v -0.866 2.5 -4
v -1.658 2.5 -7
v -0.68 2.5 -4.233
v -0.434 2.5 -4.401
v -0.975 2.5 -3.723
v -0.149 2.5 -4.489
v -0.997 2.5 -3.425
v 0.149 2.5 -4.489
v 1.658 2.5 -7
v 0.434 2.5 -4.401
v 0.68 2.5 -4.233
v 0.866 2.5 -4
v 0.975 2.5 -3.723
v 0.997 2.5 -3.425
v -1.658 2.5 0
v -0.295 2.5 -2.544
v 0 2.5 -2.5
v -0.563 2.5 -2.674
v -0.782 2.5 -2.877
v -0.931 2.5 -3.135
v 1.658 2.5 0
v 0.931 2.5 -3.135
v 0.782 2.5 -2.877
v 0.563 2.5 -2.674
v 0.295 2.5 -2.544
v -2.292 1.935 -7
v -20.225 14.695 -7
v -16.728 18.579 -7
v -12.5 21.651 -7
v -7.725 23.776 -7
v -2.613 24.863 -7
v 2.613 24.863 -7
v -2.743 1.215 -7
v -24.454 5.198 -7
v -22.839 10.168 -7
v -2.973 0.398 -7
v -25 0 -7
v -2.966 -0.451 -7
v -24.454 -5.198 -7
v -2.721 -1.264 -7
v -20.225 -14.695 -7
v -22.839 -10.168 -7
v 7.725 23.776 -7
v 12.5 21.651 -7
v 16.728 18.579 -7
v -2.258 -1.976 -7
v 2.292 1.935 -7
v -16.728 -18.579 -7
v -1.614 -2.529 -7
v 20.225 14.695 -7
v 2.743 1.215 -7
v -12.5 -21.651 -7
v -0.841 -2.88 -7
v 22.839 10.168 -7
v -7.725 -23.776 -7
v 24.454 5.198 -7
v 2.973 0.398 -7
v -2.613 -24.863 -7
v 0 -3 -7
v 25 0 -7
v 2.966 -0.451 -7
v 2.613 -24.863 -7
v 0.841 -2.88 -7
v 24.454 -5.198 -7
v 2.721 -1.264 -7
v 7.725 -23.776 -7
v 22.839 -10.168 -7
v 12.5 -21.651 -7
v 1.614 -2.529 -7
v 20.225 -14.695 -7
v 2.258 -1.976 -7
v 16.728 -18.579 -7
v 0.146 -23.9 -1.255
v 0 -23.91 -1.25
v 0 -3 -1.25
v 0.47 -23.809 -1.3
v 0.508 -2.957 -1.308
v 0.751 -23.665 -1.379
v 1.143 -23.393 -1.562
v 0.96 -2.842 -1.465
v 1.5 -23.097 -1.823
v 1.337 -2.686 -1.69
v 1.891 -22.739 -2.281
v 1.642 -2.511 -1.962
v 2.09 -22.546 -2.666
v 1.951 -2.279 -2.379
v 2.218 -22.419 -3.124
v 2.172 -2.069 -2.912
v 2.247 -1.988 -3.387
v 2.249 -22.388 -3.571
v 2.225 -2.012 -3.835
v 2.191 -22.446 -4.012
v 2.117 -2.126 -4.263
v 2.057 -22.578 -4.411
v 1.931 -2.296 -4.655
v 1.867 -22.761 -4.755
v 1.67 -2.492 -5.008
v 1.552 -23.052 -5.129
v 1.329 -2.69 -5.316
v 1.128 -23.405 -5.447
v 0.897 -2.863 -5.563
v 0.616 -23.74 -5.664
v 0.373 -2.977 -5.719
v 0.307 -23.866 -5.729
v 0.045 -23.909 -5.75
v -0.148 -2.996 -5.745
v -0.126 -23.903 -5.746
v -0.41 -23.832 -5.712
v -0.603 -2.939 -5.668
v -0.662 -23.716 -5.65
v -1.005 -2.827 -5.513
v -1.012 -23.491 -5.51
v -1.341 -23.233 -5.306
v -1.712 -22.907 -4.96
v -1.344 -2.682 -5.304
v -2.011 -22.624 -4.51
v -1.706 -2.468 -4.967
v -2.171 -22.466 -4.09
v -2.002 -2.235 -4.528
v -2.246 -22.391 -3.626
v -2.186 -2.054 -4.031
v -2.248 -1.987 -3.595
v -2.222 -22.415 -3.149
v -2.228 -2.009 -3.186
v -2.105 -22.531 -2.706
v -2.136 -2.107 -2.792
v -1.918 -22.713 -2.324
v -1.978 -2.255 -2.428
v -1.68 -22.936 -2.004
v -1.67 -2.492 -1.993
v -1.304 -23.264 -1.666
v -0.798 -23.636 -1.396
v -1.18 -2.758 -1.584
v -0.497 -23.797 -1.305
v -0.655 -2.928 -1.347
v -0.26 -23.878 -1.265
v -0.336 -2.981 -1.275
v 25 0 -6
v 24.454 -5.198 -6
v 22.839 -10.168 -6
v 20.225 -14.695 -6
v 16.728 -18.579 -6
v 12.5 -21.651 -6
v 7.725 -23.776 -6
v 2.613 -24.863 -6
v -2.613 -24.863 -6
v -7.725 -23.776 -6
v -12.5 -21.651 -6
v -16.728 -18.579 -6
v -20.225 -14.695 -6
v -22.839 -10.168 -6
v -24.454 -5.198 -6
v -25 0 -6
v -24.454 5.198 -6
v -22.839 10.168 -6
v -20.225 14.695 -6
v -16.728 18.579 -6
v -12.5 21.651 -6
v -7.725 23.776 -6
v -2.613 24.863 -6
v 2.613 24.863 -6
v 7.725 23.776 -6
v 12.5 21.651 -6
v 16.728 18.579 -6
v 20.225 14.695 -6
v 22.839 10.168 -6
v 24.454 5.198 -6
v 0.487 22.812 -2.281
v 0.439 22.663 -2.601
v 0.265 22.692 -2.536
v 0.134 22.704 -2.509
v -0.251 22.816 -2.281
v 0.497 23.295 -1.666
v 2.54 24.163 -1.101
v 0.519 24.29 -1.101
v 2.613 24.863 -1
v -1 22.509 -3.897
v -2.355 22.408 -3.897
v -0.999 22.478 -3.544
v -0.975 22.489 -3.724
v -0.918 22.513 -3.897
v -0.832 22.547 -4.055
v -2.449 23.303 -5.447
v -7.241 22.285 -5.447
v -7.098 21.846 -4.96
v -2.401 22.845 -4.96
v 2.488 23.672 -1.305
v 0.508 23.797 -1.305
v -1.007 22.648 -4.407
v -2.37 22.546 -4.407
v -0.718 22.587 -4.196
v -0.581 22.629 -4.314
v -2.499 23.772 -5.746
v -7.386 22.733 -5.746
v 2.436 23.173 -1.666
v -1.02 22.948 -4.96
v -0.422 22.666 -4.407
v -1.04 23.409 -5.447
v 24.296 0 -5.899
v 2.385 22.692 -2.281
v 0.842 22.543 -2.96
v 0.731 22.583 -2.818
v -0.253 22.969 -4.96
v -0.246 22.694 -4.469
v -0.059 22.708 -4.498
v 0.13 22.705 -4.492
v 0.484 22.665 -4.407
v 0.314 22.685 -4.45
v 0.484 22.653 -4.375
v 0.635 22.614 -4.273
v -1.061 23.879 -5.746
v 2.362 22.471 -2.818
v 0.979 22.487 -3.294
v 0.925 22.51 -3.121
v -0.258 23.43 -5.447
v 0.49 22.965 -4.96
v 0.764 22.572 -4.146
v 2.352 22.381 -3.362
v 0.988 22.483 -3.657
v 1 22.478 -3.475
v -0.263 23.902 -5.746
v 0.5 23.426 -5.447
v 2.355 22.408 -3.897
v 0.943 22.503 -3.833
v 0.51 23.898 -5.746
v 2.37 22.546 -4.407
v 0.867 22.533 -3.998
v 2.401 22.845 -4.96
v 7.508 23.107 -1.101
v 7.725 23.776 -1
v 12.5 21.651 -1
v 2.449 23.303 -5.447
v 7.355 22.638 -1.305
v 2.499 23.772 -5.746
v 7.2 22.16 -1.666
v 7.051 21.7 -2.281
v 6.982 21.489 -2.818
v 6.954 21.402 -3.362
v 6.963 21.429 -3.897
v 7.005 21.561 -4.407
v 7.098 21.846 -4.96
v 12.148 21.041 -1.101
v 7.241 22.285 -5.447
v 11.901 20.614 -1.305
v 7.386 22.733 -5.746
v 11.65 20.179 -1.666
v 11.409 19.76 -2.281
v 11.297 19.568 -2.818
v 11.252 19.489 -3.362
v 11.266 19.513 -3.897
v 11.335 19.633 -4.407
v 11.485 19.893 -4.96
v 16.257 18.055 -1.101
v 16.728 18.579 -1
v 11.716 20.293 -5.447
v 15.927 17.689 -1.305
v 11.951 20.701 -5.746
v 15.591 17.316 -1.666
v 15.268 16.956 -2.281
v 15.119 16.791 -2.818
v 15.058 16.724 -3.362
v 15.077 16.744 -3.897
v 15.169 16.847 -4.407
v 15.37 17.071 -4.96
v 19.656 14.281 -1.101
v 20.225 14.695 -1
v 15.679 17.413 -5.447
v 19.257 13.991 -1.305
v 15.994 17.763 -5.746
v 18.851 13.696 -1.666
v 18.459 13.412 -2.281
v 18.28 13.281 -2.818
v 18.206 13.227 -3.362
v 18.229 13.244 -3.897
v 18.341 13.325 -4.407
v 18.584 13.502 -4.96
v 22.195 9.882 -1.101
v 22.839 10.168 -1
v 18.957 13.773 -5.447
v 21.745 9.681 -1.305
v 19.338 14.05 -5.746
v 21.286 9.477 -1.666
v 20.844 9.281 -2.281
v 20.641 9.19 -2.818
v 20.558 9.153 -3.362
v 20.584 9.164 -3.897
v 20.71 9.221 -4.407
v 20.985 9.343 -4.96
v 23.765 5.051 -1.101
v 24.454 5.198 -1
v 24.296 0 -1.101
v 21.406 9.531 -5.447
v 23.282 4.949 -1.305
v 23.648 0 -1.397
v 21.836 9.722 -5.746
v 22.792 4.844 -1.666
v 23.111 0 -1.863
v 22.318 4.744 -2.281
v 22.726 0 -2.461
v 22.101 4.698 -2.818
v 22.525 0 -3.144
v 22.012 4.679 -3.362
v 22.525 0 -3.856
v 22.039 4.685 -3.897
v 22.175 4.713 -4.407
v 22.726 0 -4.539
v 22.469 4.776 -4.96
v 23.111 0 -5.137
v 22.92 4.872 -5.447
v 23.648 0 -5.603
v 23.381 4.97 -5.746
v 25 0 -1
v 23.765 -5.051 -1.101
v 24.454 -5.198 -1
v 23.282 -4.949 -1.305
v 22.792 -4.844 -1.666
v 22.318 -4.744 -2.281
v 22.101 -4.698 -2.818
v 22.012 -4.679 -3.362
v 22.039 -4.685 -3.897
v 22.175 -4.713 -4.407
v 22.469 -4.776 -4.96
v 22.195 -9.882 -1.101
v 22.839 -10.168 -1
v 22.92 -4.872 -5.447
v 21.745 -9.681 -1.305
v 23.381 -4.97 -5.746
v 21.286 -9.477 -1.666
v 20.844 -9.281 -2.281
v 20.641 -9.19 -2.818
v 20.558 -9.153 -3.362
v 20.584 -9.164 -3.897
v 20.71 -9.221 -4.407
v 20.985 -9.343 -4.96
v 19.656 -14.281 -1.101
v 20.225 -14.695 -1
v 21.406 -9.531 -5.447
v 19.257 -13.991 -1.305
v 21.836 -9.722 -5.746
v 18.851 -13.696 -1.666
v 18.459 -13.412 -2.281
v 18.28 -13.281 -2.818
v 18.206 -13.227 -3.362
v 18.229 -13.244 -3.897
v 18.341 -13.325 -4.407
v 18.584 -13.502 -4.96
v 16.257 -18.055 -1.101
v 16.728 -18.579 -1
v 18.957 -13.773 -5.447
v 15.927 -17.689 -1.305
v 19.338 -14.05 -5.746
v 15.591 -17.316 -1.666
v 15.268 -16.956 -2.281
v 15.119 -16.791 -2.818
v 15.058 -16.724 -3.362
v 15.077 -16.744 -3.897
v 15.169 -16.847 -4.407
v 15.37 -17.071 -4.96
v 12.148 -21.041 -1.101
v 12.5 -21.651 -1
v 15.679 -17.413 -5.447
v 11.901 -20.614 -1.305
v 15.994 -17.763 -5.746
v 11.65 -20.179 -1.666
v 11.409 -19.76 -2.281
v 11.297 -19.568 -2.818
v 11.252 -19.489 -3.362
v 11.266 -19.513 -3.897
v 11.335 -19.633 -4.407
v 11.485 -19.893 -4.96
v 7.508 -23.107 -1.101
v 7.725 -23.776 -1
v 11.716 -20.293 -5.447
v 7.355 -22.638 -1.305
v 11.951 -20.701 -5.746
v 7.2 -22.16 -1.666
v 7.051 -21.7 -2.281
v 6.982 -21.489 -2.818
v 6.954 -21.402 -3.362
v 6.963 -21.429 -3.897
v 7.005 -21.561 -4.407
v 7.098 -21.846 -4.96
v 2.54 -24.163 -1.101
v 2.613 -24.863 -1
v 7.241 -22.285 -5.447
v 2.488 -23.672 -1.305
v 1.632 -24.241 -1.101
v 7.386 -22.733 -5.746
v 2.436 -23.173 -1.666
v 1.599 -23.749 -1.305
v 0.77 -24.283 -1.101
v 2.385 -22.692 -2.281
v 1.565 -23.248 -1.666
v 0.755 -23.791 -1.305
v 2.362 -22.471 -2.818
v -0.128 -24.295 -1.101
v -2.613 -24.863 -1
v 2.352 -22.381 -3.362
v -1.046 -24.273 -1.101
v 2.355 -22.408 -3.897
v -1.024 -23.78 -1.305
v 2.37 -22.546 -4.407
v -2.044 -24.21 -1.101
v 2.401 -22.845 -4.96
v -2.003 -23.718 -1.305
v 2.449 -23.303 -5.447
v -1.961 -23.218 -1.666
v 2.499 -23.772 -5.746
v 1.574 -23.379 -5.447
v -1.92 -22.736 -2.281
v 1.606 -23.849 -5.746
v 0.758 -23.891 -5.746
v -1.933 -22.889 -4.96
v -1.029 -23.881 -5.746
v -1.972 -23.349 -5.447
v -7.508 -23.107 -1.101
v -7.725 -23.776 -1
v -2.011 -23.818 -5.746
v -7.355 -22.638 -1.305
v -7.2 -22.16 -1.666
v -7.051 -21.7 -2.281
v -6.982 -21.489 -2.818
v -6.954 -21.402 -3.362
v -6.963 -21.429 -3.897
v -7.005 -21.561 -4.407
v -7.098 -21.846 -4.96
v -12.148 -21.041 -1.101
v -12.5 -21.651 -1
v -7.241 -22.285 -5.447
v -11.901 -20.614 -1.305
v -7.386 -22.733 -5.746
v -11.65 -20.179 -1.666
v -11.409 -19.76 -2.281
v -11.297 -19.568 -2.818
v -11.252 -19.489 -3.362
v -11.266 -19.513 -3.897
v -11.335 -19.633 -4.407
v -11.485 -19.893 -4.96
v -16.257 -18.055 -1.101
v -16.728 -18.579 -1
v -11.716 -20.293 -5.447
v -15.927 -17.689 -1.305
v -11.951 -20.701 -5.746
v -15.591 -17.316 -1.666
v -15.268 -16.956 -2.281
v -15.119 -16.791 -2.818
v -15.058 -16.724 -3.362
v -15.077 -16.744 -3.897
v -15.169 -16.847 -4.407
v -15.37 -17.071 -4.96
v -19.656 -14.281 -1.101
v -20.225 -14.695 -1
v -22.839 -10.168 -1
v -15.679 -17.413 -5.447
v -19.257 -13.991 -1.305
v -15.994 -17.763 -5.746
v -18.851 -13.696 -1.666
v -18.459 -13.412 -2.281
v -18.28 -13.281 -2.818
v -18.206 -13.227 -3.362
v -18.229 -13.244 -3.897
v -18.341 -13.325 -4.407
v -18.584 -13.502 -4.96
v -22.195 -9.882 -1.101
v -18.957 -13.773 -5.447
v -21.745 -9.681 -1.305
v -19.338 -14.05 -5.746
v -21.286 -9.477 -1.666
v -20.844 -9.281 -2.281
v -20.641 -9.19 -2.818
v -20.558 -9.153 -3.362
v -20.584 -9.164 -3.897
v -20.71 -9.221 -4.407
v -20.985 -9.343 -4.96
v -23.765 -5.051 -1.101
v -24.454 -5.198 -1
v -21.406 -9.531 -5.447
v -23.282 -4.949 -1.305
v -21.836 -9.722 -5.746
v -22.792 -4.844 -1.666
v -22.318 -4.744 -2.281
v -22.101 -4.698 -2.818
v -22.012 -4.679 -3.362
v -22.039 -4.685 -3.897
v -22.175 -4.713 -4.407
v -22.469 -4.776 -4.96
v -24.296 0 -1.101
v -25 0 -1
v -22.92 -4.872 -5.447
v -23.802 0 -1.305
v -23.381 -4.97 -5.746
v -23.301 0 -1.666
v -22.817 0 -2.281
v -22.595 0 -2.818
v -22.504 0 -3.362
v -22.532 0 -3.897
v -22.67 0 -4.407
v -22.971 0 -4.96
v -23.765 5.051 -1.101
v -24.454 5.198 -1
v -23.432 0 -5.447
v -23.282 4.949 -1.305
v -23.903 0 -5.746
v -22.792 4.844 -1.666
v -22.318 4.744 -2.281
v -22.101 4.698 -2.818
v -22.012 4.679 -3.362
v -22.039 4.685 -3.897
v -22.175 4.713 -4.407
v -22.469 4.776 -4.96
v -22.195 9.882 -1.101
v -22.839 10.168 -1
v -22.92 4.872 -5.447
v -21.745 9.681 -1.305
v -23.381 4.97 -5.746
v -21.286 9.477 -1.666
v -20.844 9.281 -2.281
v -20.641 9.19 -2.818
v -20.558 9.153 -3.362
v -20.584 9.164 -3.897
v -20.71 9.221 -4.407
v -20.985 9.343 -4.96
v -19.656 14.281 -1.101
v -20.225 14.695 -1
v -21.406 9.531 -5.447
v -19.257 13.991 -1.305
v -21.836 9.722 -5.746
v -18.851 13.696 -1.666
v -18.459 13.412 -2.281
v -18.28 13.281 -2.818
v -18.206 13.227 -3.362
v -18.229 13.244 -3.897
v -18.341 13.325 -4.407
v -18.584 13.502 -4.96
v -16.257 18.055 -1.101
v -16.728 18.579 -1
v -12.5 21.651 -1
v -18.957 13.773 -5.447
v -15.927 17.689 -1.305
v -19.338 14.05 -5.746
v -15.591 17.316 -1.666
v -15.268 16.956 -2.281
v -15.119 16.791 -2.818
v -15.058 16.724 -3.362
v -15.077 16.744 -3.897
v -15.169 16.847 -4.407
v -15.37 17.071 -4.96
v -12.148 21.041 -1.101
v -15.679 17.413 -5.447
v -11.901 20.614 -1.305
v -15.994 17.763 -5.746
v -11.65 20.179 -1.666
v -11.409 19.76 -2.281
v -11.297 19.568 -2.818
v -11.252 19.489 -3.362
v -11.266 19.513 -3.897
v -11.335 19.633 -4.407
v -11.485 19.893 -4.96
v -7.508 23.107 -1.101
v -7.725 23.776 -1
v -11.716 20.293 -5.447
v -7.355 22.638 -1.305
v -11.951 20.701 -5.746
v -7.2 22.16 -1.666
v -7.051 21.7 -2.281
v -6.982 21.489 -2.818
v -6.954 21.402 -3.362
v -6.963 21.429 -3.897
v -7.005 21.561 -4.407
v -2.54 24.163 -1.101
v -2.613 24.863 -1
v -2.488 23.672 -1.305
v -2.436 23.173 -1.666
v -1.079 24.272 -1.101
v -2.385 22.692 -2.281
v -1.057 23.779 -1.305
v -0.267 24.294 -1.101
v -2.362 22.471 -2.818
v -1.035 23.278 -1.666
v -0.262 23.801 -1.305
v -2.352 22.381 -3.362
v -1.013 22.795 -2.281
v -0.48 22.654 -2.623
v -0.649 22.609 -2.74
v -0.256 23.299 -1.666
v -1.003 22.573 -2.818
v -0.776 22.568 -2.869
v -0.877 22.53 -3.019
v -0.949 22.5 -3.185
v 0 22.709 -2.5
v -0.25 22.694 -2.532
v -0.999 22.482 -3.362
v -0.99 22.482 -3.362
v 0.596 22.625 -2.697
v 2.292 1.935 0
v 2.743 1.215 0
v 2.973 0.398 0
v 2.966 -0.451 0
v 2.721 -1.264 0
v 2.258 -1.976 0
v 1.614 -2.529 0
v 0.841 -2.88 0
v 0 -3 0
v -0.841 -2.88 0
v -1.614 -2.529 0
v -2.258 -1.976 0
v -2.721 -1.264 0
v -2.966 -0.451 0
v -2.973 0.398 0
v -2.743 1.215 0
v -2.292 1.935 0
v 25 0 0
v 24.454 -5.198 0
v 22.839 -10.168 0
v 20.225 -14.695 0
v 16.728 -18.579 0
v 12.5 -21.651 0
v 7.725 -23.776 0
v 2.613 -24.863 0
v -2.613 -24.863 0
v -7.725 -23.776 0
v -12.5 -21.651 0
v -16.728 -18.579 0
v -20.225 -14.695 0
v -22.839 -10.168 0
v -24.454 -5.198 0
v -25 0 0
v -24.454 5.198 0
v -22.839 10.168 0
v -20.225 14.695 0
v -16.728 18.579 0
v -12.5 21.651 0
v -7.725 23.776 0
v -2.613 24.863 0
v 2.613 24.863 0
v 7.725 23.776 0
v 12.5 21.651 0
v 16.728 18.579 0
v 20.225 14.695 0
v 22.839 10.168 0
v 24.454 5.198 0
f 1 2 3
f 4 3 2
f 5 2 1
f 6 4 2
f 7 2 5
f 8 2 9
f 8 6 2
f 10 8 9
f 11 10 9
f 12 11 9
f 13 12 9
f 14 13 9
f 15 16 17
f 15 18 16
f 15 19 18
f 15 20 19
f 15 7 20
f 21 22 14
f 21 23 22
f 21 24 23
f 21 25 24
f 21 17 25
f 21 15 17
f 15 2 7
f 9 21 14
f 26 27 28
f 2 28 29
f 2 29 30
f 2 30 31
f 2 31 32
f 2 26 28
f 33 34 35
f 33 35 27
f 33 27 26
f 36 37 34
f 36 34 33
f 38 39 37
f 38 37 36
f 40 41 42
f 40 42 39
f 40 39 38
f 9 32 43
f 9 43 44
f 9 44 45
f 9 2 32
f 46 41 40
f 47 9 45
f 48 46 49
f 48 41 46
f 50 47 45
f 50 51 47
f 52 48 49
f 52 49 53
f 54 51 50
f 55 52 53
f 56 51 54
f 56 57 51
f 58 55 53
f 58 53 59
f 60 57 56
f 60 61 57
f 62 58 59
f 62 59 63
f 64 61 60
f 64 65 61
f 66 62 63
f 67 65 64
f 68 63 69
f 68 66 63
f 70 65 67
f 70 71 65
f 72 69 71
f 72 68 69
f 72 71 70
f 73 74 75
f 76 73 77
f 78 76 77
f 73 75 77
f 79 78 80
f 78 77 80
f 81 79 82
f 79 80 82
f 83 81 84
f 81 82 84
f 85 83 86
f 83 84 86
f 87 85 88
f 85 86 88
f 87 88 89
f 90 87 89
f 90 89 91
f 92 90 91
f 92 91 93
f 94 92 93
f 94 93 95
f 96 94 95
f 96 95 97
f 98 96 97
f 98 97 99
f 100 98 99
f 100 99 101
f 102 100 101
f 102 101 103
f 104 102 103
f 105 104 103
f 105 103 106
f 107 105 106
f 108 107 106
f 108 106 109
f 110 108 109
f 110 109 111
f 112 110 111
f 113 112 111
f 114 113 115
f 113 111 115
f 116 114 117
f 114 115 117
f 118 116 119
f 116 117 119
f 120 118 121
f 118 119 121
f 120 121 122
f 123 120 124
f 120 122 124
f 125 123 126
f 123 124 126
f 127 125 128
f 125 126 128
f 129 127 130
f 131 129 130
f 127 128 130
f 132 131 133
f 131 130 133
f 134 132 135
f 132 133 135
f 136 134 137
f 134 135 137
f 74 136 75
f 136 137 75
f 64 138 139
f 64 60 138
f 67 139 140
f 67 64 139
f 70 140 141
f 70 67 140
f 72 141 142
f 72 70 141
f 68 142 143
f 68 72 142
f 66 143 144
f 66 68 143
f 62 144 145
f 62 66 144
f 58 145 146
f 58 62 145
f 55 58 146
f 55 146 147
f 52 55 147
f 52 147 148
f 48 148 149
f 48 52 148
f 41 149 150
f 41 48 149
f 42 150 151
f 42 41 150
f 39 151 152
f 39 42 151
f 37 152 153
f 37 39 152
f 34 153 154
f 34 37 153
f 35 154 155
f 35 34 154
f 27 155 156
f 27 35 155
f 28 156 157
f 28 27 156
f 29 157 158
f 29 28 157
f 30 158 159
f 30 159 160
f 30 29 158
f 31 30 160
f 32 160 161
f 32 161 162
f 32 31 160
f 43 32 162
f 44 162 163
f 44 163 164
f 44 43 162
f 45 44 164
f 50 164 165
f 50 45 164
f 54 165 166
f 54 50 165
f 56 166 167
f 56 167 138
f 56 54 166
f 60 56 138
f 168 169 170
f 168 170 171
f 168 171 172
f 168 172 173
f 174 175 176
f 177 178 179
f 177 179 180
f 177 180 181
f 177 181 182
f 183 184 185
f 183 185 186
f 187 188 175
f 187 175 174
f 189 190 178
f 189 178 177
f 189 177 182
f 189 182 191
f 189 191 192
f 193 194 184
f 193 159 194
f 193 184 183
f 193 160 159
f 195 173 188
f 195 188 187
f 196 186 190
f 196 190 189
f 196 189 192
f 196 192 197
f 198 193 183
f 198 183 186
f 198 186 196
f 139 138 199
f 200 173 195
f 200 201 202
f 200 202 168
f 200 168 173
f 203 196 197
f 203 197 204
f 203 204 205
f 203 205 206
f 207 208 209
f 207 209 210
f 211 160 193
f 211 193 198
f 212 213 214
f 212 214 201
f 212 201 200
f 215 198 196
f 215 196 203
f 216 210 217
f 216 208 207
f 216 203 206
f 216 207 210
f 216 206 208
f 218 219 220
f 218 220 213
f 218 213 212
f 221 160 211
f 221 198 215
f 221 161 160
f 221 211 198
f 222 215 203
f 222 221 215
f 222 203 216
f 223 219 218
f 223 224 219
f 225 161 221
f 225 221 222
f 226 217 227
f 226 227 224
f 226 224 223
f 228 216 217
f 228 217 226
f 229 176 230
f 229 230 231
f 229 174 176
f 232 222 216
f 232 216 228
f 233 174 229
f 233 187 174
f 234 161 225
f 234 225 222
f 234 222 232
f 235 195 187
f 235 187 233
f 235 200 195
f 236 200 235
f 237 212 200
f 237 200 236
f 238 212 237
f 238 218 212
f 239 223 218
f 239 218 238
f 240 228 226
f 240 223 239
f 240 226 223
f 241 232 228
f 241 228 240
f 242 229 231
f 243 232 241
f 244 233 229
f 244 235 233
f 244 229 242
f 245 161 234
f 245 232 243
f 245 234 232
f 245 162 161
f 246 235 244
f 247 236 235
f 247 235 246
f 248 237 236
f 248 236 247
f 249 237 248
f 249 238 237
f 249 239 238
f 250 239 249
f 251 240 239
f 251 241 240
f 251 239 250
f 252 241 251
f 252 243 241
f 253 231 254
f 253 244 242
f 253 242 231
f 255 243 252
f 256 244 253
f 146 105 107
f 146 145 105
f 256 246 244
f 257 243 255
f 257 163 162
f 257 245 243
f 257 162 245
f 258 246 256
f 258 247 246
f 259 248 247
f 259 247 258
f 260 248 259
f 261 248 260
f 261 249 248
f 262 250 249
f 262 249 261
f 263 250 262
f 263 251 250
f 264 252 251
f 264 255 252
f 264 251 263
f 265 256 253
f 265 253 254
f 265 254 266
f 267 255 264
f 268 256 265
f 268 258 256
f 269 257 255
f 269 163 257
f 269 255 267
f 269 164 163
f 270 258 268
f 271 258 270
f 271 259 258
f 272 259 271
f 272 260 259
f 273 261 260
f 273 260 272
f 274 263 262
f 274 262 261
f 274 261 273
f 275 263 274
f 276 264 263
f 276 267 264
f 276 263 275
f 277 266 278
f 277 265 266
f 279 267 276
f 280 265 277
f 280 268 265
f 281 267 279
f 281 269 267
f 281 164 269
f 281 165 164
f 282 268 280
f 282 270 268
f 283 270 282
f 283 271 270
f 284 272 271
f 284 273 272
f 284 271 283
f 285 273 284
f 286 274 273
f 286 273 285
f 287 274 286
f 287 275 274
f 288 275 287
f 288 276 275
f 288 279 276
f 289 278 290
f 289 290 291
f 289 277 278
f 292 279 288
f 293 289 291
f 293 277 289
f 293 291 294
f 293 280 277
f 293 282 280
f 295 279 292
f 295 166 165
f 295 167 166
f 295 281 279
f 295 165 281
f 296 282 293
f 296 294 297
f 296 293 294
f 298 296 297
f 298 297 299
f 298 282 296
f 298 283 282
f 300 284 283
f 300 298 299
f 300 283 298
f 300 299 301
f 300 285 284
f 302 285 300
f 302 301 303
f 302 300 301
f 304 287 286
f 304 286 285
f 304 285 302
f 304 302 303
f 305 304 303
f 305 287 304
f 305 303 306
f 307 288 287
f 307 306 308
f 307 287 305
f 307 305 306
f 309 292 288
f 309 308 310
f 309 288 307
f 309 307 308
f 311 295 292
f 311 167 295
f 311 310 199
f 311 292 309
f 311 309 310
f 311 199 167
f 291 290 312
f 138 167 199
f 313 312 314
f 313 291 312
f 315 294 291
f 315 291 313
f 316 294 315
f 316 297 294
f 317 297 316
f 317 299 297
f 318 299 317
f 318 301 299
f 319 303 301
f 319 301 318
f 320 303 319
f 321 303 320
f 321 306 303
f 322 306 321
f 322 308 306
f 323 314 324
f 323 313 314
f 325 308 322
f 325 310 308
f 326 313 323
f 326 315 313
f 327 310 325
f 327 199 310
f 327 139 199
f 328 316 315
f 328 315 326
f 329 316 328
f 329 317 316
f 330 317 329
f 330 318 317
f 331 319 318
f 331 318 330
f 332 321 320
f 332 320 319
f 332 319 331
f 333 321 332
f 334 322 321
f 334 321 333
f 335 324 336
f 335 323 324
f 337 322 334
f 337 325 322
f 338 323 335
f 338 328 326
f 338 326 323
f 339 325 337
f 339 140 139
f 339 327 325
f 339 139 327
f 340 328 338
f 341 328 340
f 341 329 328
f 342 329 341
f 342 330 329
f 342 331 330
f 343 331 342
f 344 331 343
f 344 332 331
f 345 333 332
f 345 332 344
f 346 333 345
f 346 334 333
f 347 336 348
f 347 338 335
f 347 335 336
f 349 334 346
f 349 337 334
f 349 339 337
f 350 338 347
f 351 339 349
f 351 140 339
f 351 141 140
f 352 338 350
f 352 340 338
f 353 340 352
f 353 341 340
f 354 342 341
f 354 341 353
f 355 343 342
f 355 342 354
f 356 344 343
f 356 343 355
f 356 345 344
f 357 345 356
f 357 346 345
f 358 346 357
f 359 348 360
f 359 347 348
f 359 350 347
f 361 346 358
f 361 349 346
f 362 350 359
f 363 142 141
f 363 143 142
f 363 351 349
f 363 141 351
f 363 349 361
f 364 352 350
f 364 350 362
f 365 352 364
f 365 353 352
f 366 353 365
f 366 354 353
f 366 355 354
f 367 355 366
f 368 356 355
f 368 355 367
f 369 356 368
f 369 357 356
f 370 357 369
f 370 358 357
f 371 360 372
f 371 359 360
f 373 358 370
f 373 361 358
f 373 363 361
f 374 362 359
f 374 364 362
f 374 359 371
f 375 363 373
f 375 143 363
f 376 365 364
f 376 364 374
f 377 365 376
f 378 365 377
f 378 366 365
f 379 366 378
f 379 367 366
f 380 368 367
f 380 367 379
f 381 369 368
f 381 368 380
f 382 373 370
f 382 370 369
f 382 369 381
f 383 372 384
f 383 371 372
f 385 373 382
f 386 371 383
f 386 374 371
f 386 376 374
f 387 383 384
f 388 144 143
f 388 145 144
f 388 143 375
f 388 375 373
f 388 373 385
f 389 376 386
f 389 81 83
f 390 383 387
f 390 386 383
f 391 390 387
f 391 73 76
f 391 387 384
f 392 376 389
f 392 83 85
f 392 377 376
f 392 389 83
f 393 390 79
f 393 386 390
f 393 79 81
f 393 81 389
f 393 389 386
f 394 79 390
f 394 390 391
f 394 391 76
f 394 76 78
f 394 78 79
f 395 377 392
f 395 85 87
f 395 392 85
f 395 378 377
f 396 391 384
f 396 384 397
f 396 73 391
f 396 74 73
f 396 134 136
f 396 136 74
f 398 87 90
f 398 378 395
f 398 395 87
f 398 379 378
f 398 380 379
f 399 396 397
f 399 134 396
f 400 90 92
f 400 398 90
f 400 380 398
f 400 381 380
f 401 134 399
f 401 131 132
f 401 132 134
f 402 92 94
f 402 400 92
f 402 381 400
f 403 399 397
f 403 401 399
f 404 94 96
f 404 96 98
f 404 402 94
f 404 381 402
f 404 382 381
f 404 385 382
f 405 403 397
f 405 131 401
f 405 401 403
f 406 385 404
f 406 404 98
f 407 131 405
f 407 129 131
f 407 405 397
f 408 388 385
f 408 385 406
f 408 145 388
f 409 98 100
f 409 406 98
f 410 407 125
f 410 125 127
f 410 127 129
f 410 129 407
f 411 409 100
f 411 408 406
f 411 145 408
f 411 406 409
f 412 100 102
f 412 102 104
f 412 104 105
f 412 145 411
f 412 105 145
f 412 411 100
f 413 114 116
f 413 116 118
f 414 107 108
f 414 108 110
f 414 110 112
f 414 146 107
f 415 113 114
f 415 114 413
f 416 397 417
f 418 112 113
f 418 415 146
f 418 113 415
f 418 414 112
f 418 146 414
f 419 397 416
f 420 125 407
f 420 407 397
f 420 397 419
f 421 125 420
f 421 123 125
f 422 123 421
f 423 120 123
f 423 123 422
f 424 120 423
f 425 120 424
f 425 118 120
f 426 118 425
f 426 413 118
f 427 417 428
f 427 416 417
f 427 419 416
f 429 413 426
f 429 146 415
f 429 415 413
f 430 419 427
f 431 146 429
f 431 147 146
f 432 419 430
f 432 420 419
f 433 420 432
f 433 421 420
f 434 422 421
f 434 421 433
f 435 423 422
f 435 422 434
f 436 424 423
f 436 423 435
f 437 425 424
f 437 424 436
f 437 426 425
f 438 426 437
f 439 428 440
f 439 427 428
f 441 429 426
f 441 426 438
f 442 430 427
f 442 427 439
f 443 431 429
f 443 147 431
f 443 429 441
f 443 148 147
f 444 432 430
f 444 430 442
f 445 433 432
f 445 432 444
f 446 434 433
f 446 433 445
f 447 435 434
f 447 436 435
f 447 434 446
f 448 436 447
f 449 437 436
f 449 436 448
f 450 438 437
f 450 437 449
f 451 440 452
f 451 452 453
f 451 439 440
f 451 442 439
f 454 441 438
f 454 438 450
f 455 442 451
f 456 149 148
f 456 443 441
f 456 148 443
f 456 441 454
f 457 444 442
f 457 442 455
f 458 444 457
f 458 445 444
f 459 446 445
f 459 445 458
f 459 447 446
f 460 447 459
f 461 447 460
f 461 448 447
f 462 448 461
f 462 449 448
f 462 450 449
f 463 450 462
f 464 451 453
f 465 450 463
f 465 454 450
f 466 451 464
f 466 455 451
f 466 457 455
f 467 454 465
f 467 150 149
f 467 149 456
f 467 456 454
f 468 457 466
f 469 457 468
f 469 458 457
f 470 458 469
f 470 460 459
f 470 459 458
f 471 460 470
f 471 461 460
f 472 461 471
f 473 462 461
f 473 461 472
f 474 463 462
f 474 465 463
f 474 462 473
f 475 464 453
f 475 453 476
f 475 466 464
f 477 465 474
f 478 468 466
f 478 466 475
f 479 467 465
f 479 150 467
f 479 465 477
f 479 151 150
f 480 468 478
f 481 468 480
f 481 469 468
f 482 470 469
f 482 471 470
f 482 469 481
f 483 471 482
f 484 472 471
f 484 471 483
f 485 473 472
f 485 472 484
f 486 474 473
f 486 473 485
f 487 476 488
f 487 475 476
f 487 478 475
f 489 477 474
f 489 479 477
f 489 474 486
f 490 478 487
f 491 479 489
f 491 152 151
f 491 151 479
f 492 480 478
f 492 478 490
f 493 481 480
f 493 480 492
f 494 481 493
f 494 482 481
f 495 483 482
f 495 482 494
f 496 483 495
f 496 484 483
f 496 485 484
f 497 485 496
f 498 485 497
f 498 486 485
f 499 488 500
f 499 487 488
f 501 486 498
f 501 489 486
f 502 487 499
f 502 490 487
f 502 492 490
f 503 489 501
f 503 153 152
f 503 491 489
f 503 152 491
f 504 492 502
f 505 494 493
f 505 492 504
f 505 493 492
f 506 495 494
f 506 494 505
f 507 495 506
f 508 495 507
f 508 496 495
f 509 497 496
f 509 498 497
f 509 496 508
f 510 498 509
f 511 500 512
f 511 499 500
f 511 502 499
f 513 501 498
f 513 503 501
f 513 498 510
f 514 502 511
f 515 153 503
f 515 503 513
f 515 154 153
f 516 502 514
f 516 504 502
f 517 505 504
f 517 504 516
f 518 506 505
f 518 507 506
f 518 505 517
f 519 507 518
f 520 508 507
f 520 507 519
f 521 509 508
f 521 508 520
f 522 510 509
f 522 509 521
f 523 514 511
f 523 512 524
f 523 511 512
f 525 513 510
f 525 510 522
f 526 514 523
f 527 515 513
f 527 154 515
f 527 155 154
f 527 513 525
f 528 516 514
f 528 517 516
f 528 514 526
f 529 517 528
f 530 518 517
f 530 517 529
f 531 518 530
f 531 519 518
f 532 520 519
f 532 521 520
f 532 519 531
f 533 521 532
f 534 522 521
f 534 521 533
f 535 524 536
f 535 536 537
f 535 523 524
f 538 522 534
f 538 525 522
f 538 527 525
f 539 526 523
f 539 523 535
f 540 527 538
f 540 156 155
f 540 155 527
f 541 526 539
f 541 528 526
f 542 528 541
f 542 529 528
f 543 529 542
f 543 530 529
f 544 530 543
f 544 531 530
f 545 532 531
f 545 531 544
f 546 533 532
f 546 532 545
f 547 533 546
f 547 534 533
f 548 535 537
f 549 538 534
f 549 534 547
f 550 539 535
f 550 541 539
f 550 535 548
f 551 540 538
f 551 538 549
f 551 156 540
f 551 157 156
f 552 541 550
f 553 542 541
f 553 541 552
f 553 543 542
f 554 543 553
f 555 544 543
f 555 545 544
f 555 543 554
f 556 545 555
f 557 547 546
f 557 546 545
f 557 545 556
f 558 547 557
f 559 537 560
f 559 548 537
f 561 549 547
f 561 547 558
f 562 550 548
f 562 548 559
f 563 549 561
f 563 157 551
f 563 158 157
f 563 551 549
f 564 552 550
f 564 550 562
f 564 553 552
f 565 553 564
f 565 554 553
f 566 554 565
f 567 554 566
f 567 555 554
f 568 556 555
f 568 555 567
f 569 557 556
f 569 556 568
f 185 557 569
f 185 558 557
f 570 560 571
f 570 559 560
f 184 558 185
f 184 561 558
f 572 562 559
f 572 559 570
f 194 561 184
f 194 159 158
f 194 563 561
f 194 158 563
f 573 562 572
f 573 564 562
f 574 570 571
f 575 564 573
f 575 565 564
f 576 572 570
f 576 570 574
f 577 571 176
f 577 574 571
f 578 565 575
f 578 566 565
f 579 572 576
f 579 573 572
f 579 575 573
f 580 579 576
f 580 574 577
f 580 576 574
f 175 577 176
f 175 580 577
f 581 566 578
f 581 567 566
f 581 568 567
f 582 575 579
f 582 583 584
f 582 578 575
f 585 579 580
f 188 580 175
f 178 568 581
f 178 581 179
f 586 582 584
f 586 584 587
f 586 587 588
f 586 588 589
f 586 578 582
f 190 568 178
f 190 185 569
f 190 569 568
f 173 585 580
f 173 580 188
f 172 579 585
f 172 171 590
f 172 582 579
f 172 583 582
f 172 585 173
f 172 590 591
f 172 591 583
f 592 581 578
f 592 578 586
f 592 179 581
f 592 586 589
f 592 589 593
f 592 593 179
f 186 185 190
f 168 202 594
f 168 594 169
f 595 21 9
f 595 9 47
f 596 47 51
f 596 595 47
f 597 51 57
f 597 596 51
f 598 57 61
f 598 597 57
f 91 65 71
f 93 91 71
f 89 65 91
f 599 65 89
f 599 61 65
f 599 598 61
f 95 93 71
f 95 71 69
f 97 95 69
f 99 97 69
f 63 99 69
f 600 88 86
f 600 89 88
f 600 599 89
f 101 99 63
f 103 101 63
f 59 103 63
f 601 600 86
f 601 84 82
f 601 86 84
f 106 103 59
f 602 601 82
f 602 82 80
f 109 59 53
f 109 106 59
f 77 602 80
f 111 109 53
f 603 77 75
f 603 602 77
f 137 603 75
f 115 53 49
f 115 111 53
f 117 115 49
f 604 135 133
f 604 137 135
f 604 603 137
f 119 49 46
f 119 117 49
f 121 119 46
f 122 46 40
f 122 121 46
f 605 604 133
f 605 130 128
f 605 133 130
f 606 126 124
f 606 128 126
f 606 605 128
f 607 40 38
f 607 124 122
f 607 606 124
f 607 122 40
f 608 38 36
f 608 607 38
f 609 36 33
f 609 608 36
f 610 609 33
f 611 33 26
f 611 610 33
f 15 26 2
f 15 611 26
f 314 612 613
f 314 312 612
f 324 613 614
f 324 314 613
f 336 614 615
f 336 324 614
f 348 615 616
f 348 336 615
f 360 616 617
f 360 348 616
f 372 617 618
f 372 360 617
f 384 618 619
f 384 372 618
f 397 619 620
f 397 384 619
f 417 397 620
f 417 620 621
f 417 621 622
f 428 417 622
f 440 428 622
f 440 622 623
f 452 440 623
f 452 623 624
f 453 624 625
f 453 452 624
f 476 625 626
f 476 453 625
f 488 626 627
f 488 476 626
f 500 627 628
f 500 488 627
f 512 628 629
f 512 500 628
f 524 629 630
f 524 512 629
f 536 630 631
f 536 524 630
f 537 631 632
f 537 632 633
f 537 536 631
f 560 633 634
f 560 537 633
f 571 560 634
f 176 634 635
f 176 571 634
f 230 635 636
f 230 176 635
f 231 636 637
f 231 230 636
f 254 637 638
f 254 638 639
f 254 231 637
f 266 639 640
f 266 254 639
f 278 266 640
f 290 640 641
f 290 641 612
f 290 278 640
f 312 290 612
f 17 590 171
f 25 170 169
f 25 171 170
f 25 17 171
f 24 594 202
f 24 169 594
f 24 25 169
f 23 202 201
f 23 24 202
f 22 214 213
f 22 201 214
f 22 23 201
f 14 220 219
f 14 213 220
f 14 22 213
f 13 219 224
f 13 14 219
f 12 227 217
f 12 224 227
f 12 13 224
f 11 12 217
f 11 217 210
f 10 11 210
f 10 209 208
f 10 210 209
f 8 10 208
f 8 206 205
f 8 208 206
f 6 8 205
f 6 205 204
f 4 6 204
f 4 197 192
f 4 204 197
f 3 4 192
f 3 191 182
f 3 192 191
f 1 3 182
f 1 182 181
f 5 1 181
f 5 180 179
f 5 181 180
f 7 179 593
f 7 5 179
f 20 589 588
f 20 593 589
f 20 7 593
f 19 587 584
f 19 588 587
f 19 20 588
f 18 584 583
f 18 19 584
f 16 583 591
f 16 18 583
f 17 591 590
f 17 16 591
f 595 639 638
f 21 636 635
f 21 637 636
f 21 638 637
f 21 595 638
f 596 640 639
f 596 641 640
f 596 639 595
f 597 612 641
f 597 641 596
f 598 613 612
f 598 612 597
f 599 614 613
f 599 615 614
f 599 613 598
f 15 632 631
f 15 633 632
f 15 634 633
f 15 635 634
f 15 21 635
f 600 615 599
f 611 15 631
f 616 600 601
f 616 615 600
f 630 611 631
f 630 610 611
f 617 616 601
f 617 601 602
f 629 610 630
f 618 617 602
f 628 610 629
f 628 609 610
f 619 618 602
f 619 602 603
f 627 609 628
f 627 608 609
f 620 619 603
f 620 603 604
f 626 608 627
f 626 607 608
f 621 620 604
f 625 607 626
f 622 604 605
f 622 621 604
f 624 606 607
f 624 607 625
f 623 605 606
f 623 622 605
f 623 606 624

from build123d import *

# Parameters (mm, degrees)
CUT_EXTRUDE1_DEPTH      = 37.041642582
CUT_EXTRUDE2_DEPTH      = 37.041642582
CUT_EXTRUDE2_DEPTH_BACK = 37.041642582
SKETCH4_R               = 1
SKETCH6_R               = 2.25
CUT_EXTRUDE3_DEPTH      = 37.04164274


with BuildPart() as part:
    # Sketch2 → Revolve1 (revolve)
    with BuildSketch(Plane(origin=(0, 0, 0), x_dir=(1, 0, 0), z_dir=(0, 1, 0))):
        with BuildLine():
            Line((25, 6), (25, 7))
            Line((25, 7), (0, 7))
            Line((0, 7), (0, 0))
            Line((0, 0), (25, 0))
            Line((25, 0), (25, 1))
            ThreePointArc((25, 1), (22.5, 3.5), (25, 6))
        make_face()
    revolve(axis=Axis((0, 0, 0), (0, 0, -1)))

    # Sketch3 → Cut-Extrude1 (cut, through all)
    with BuildSketch(Plane.XY):
        with BuildLine():
            Line((-1.658312395, 2.5), (1.658312395, 2.5))
            ThreePointArc((1.658312395, 2.5), (0, -3), (-1.658312395, 2.5))
        make_face()
    extrude(amount=-CUT_EXTRUDE1_DEPTH, mode=Mode.SUBTRACT)

    # Sketch4 → Cut-Extrude2 (cut, two sides: drawn at the far end of the back side and taken through both)
    with BuildSketch(Plane(origin=(0, 0, 0), x_dir=(1, 0, 0), z_dir=(0, 1, 0)).offset(-CUT_EXTRUDE2_DEPTH_BACK)):
        with Locations(Location((0, 3.5, 0), (0, 0, 270))):
            Circle(SKETCH4_R)
    extrude(amount=CUT_EXTRUDE2_DEPTH + CUT_EXTRUDE2_DEPTH_BACK, mode=Mode.SUBTRACT)

    # Sketch6 → Cut-Extrude3 (cut, through all)
    with BuildSketch(Plane(origin=(0, 0, 0), x_dir=(1, 0, 0), z_dir=(0, 1, 0))):
        with Locations(Location((0, 3.5, 0), (0, 0, 270))):
            Circle(SKETCH6_R)
    extrude(amount=-CUT_EXTRUDE3_DEPTH, mode=Mode.SUBTRACT)


solid = part.part
